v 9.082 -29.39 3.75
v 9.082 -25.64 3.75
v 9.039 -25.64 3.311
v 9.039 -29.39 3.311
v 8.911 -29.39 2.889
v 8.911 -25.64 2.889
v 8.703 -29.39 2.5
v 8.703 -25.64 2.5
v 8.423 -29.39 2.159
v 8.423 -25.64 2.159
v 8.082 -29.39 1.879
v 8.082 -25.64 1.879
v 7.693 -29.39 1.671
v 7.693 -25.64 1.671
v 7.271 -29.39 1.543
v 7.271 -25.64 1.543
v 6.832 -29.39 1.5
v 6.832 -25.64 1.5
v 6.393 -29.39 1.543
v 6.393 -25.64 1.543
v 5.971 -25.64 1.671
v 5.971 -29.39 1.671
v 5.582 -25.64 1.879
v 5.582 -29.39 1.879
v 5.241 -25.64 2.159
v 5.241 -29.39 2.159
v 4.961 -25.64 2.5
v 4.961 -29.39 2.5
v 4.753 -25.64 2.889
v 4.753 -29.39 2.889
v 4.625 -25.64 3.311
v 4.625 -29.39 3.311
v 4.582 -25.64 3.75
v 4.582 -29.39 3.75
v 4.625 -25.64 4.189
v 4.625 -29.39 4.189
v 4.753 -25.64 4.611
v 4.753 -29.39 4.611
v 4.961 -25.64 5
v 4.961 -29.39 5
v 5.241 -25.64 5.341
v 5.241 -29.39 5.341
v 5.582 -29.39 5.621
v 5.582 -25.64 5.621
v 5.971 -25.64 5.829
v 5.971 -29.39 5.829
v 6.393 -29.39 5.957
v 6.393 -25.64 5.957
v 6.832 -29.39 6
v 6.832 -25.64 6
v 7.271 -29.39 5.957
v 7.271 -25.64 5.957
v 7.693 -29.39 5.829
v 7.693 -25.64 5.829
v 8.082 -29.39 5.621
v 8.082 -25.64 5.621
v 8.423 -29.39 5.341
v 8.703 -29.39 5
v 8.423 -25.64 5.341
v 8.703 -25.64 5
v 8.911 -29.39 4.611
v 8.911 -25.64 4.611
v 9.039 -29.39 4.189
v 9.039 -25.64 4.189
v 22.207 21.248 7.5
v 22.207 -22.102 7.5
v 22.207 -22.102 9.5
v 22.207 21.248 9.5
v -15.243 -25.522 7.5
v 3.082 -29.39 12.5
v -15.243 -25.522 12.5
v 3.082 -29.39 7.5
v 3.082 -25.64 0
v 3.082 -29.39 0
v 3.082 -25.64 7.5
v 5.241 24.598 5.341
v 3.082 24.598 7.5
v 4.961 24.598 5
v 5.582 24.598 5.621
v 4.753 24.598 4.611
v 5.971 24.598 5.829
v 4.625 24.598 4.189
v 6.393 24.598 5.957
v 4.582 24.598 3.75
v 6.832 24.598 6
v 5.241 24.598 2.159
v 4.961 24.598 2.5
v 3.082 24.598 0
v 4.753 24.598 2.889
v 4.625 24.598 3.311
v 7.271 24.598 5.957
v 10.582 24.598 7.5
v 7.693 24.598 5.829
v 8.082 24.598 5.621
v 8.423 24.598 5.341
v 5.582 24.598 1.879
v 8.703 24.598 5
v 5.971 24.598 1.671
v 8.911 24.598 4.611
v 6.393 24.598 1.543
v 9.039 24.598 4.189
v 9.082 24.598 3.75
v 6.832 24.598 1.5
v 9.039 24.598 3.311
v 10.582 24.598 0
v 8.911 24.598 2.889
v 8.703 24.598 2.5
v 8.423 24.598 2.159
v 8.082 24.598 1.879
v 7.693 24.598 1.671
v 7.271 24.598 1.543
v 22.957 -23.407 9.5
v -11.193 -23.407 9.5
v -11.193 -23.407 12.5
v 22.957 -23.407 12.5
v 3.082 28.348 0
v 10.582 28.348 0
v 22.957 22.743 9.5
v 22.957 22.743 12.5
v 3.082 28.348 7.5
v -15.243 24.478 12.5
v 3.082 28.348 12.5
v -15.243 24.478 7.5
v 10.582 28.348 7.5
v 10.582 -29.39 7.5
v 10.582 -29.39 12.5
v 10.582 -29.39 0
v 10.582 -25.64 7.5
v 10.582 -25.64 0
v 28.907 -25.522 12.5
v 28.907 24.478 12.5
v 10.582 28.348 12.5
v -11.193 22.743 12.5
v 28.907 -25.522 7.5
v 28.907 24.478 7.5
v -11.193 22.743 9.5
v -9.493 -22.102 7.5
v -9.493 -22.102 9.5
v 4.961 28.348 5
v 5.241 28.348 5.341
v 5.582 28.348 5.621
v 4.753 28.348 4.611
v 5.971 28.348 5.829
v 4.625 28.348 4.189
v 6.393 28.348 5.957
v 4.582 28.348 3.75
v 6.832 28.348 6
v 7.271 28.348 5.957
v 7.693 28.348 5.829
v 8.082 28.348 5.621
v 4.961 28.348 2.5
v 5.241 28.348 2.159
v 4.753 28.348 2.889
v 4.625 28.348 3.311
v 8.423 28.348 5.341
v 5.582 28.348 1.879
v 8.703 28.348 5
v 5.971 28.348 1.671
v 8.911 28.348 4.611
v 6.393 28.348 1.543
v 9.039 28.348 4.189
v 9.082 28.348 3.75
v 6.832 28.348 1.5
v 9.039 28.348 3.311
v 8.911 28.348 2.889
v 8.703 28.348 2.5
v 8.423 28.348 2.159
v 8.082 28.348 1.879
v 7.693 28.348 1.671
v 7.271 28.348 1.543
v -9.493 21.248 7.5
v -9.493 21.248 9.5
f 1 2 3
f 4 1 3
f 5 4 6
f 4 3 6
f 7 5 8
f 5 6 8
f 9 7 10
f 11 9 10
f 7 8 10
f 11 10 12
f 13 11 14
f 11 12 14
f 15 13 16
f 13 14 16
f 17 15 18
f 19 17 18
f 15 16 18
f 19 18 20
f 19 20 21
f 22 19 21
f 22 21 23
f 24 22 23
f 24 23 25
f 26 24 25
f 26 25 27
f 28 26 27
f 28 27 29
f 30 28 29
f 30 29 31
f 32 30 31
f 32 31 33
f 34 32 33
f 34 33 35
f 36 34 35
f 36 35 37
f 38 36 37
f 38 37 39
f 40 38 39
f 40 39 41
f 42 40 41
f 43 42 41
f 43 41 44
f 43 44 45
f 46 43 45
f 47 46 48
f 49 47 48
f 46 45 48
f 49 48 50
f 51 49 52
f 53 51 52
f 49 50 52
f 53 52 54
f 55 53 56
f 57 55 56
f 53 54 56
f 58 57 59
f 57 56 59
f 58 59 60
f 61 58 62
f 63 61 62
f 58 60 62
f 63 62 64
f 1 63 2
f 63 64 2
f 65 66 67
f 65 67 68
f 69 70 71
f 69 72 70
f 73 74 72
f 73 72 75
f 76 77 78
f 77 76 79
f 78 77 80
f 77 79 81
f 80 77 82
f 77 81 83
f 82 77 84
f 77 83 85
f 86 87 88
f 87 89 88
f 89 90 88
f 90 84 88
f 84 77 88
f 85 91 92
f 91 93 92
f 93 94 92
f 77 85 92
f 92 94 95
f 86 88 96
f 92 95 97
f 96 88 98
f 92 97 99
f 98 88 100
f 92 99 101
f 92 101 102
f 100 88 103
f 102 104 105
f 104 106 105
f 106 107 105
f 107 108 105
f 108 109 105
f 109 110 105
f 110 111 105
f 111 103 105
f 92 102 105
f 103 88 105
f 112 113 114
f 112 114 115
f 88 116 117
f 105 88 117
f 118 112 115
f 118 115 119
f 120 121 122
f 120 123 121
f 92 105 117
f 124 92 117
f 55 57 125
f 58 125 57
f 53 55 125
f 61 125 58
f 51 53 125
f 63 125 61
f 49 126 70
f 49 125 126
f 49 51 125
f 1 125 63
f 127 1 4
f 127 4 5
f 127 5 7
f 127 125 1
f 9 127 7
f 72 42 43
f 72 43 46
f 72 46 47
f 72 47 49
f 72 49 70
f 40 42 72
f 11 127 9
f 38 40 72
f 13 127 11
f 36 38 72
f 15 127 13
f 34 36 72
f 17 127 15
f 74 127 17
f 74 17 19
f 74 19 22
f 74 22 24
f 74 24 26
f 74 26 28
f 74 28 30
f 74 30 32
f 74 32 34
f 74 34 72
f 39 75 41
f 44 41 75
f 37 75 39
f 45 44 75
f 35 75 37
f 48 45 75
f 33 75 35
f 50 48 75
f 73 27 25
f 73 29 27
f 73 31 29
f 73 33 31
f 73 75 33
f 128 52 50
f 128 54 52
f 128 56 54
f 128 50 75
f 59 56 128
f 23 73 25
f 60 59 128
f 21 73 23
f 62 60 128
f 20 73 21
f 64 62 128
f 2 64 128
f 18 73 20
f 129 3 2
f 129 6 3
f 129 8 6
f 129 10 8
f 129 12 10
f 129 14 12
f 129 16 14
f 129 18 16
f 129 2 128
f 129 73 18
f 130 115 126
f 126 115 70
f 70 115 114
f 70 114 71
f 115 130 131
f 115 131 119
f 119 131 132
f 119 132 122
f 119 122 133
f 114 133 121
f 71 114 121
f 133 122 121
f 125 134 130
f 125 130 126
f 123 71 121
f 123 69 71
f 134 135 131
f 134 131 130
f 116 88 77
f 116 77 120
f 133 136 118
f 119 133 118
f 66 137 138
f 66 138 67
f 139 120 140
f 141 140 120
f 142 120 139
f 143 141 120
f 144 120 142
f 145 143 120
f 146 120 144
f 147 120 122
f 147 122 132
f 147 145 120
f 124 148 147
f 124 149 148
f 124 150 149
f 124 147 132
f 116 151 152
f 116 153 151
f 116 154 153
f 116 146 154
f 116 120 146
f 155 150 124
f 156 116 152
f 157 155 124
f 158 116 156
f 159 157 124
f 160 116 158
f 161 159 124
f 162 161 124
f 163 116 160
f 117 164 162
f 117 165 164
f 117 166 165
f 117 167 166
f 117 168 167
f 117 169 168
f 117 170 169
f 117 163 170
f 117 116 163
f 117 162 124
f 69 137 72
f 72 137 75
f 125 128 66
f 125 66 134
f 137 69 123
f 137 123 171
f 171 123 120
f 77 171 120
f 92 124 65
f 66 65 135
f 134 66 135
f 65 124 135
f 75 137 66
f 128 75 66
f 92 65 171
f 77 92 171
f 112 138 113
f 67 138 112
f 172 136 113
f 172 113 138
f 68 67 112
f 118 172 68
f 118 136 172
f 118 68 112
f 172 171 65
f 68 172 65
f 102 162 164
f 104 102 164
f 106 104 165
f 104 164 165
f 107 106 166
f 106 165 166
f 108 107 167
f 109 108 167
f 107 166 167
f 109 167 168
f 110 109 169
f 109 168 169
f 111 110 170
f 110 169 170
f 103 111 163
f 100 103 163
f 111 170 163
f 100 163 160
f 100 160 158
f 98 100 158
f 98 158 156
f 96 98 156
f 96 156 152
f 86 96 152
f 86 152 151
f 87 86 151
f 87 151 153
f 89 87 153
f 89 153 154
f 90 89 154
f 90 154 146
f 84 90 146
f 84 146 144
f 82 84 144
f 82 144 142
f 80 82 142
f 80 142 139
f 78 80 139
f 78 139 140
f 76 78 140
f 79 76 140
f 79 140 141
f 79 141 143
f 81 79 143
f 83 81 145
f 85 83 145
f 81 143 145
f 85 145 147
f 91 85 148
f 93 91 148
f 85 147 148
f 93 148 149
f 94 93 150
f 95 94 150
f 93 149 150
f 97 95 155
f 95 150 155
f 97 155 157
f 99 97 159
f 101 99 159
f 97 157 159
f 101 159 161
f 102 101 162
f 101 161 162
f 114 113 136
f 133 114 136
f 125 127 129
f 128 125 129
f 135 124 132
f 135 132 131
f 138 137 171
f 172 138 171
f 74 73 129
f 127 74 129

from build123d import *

# Parameters (mm, degrees)
ESQUISSE1_W             = 7.5
ESQUISSE1_H             = 3.75
BOSS_EXTRU_1_DEPTH      = 7.5
BOSS_EXTRU_1_2_DEPTH    = 7.5
ESQUISSE2_R             = 2.25
ENL_V_MAT_EXTRU_1_DEPTH = 58.737772997
ESQUISSE4_W             = 31.7
ESQUISSE4_H             = 43.35
BOSS_EXTRU_2_DEPTH      = 2
ESQUISSE5_W             = 34.15
ESQUISSE5_H             = 46.15
BOSS_EXTRU_3_DEPTH      = 3


with BuildPart() as part:
    # Esquisse1 → Boss.-Extru.1 (new body)
    with BuildSketch(Plane.XY):
        with Locations((6.831943462, 26.473190482)):
            Rectangle(ESQUISSE1_W, ESQUISSE1_H)
    extrude(amount=BOSS_EXTRU_1_DEPTH)


with BuildPart() as body_2:
    # Esquisse1 → Boss.-Extru.1 2 (new body)
    with BuildSketch(Plane.XY):
        with Locations((6.831943462, -27.514582515)):
            Rectangle(ESQUISSE1_W, ESQUISSE1_H)
    extrude(amount=BOSS_EXTRU_1_2_DEPTH)


with BuildPart() as enl_v_mat_extru_1_tool:
    # Esquisse2 → Enlèv. mat.-Extru.1 (new body, through all)
    with BuildSketch(Plane(origin=(0, 28.348190482, 0), x_dir=(1, 0, 0), z_dir=(0, 1, 0))):
        with Locations((6.831943462, -3.75)):
            Circle(ESQUISSE2_R)
    extrude(amount=-ENL_V_MAT_EXTRU_1_DEPTH)


with BuildPart() as part_1:
    add(part.part)

    # Enlèv. mat.-Extru.1: cut by enl_v_mat_extru_1_tool
    add(enl_v_mat_extru_1_tool.part, mode=Mode.SUBTRACT)



with BuildPart() as body_2_1:
    add(body_2.part)

    # Enlèv. mat.-Extru.1: cut by enl_v_mat_extru_1_tool
    add(enl_v_mat_extru_1_tool.part, mode=Mode.SUBTRACT)


with BuildPart() as part_2:
    add(part_1.part)

    add(body_2_1.part)  # Boss.-Extru.2 merges body 2
    # Esquisse4 → Boss.-Extru.2 (add)
    with BuildSketch(Plane.XY.offset(7.5)):
        Polygon((-15.243056538, 24.478190482), (-15.243056538, -25.521809518), (3.081943462, -29.389582515), (10.581943462, -29.389582515), (28.906943461, -25.521809518), (28.906943461, 24.478190482), (10.581943462, 28.348190482), (3.081943462, 28.348190482), align=None)
        with Locations((6.356943462, -0.426809518)):
            Rectangle(ESQUISSE4_W, ESQUISSE4_H, mode=Mode.SUBTRACT)
    extrude(amount=BOSS_EXTRU_2_DEPTH)

    # Esquisse5 → Boss.-Extru.3 (add)
    with BuildSketch(Plane.XY.offset(9.5)):
        Polygon((-15.243056538, 24.478190482), (3.081943462, 28.348190482), (10.581943462, 28.348190482), (28.906943461, 24.478190482), (28.906943461, -25.521809518), (10.581943462, -29.389582515), (3.081943462, -29.389582515), (-15.243056538, -25.521809518), align=None)
        with Locations((5.881943462, -0.331809518)):
            Rectangle(ESQUISSE5_W, ESQUISSE5_H, mode=Mode.SUBTRACT)
    extrude(amount=BOSS_EXTRU_3_DEPTH)


solid = part_2.part
